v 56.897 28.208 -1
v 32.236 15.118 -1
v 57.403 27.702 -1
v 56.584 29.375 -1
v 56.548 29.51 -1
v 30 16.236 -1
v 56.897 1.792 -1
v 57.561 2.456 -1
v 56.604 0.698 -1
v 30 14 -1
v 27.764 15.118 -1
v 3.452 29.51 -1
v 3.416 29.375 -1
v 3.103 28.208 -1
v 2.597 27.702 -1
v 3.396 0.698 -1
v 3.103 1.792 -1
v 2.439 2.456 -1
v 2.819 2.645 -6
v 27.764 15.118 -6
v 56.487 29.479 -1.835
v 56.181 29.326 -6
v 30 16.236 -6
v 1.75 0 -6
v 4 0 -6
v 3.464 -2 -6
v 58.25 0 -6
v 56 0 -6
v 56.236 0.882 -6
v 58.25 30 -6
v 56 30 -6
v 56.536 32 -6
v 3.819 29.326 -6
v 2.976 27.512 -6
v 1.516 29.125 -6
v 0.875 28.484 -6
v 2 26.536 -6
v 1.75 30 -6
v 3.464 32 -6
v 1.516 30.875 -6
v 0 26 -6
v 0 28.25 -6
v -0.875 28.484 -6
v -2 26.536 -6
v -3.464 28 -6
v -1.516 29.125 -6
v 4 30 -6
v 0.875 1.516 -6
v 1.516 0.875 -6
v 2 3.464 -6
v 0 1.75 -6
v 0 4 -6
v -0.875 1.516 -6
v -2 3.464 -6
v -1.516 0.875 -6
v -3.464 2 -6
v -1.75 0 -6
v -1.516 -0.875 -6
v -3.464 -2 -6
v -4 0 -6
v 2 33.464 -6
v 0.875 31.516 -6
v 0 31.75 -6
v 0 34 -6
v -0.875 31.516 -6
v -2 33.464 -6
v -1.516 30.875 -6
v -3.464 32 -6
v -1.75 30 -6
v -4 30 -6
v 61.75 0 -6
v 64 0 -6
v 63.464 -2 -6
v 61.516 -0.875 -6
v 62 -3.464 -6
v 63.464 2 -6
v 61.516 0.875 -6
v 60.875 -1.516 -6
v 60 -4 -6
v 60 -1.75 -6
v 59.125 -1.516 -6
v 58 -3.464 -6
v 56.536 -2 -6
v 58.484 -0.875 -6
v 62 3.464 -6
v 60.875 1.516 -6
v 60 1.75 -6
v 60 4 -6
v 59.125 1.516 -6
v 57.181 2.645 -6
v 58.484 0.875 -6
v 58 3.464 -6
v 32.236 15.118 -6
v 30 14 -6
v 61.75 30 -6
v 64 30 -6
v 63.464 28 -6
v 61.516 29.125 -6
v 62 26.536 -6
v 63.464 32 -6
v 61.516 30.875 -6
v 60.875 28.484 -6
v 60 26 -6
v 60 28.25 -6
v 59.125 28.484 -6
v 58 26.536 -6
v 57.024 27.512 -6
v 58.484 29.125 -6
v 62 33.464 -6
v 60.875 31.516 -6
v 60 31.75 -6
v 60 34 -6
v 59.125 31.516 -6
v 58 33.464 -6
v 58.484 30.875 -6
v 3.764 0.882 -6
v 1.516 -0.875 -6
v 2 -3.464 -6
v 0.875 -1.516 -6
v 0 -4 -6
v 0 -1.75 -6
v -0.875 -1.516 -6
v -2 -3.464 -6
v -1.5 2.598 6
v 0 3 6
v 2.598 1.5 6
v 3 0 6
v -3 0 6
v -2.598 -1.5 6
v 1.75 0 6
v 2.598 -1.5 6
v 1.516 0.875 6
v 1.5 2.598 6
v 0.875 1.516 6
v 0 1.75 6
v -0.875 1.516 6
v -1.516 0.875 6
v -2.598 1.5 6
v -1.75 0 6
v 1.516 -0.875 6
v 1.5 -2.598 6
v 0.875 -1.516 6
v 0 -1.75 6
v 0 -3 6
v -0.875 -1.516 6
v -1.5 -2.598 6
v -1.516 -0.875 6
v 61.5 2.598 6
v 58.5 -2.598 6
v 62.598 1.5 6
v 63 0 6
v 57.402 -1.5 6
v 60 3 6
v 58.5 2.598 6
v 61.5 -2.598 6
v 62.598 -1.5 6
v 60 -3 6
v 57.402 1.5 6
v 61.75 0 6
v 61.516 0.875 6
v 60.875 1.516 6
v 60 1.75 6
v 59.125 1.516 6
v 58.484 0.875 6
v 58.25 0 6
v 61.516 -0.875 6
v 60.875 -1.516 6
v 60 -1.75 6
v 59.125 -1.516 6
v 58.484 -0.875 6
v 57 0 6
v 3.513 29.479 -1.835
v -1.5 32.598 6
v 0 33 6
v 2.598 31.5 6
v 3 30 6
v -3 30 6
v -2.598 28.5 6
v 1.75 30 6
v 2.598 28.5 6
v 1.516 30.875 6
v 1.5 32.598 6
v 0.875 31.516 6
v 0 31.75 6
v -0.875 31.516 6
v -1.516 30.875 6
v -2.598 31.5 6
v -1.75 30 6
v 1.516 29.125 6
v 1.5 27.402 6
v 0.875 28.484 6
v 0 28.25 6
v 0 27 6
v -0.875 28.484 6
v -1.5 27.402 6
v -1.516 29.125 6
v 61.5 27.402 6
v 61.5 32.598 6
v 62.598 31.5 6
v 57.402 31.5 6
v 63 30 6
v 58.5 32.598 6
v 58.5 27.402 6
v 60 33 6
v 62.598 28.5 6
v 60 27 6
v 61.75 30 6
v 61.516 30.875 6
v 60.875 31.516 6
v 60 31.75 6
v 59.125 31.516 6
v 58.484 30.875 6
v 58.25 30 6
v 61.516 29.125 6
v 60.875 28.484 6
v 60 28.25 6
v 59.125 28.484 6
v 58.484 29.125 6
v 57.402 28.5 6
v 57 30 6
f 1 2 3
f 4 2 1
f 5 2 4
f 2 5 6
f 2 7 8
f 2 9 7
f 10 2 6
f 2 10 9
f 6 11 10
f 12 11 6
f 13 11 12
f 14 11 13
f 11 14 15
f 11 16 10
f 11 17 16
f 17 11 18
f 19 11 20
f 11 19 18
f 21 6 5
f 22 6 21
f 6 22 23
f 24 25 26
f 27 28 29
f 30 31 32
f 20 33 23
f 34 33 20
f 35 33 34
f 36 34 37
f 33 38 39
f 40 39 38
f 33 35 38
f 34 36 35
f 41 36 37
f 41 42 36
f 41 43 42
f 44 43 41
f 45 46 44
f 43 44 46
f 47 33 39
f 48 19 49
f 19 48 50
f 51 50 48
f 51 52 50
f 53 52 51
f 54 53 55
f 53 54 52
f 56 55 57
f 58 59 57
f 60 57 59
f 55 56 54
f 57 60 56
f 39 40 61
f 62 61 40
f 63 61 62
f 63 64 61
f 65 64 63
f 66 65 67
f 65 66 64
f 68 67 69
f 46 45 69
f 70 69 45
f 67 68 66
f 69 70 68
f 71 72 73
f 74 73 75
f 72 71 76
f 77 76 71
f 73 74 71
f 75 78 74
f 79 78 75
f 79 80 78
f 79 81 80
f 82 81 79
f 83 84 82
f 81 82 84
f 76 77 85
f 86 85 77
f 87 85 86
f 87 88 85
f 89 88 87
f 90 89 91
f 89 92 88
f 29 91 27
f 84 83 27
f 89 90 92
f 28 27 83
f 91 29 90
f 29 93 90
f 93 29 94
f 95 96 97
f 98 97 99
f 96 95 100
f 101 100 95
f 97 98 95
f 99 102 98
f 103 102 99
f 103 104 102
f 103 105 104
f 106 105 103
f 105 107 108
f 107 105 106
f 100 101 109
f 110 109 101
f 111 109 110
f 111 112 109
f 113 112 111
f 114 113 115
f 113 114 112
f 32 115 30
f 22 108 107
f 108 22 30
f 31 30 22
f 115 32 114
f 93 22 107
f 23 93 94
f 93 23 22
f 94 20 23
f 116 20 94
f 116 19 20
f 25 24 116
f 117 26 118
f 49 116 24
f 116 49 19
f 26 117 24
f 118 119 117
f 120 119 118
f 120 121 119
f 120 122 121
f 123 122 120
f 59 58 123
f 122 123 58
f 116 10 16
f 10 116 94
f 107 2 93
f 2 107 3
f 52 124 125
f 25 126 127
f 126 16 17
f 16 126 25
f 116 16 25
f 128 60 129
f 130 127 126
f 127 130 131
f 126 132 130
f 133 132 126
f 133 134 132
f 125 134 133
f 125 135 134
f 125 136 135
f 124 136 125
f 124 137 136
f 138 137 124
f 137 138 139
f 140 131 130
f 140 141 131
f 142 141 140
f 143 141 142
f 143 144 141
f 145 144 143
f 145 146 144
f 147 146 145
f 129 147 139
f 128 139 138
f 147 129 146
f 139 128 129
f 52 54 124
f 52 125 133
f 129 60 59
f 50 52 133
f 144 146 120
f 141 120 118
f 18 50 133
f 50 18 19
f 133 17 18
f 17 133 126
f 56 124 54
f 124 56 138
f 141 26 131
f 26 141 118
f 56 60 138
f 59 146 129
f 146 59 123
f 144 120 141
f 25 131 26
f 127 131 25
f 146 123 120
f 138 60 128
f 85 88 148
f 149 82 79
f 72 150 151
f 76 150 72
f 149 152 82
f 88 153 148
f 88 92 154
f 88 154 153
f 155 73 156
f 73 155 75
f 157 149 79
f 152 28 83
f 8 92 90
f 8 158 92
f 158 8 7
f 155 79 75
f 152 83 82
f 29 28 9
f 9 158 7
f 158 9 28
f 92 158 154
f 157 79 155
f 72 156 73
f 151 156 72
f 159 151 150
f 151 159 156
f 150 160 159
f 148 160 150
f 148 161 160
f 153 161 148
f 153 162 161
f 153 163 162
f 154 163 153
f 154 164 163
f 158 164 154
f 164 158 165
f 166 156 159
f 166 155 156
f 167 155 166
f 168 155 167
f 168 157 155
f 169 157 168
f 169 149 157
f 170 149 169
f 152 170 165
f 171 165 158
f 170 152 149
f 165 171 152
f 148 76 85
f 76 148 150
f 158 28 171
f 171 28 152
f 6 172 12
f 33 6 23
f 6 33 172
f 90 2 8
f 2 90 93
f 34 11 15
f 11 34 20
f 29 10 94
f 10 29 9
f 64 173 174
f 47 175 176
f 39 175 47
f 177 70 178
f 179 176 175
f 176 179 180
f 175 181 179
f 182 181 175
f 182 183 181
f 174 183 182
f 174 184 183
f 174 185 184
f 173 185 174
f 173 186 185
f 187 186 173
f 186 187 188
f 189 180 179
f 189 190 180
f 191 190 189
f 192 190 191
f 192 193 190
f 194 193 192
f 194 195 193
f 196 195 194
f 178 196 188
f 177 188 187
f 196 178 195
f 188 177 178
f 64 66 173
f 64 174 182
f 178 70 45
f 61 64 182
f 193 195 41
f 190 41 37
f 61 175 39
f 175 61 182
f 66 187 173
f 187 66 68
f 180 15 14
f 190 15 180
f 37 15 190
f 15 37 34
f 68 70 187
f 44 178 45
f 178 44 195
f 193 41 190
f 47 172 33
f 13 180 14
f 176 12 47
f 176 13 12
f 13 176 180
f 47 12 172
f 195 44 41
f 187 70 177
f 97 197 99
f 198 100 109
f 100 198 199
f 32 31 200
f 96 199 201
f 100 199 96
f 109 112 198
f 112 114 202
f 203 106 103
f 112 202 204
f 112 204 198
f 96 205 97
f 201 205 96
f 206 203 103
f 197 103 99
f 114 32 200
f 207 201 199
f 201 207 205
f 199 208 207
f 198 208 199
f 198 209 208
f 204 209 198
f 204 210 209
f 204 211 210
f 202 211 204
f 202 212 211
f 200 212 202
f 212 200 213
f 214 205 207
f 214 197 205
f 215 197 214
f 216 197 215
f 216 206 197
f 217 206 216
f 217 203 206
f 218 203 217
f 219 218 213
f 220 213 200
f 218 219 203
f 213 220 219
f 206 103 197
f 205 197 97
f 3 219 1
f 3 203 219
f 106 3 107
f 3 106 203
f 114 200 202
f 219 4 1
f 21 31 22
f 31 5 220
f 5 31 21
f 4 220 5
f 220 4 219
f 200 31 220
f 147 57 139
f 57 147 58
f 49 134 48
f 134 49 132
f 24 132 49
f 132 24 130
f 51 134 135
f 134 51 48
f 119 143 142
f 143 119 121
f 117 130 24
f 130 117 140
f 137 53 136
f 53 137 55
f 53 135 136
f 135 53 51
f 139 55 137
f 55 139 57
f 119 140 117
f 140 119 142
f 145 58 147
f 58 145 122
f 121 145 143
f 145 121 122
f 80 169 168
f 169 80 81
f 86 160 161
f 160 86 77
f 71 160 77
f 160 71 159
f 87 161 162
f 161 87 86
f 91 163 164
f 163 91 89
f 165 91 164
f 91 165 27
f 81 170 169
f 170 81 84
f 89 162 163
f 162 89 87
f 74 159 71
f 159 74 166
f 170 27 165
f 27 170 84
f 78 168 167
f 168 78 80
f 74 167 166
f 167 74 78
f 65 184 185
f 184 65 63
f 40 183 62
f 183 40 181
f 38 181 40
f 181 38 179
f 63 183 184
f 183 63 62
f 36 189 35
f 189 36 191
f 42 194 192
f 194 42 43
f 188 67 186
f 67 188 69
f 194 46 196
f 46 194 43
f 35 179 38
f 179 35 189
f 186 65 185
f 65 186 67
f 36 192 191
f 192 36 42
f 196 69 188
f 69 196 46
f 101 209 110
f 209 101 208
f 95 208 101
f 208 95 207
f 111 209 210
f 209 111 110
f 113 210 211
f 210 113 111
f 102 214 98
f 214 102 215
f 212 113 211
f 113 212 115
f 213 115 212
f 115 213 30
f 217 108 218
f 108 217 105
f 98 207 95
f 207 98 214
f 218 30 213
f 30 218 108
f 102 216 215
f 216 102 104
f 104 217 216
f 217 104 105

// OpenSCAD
boss_i_radius = 1.75;
boss_e_radius = 3;
h_space = 60;
v_space = 30;
boss_height = 12;

boss_rows = 2;
boss_columns = 2;

difference() {
  union(){
    for(v = [0:1:boss_rows-1]) {
      v_offset = v_space*v;
      for(h = [0:1:boss_columns-1]) {
          translate([h_space*h,v_offset,0]) {
            if(h!=boss_columns-1){
              translate([0,-1,-boss_height/2]) {
                if(v%2 == 1) {
                  rotate(-90+atan(h_space/v_space)){
                    cube([sqrt(h_space*h_space+v_space*v_space),2,5], center=false);
                  }
                } else {
                  rotate(90-atan(h_space/v_space)){
                    cube([sqrt(h_space*h_space+v_space*v_space),2,5], center=false);
                  }
                 }
               }
             }
            cylinder($fn=12,h=boss_height, r1=boss_e_radius+1, r2=boss_e_radius, center=true);
          }
      }
    }
  }
  for(v = [0:1:boss_rows-1]) {
  v_offset = v_space*v;
  for(h = [0:1:boss_columns-1]) {
      translate([h_space*h,v_offset,0]) {
        cylinder($fn=12, h=boss_height, r1=boss_i_radius, r2=boss_i_radius, center=true);
      }
    }
  }
}
